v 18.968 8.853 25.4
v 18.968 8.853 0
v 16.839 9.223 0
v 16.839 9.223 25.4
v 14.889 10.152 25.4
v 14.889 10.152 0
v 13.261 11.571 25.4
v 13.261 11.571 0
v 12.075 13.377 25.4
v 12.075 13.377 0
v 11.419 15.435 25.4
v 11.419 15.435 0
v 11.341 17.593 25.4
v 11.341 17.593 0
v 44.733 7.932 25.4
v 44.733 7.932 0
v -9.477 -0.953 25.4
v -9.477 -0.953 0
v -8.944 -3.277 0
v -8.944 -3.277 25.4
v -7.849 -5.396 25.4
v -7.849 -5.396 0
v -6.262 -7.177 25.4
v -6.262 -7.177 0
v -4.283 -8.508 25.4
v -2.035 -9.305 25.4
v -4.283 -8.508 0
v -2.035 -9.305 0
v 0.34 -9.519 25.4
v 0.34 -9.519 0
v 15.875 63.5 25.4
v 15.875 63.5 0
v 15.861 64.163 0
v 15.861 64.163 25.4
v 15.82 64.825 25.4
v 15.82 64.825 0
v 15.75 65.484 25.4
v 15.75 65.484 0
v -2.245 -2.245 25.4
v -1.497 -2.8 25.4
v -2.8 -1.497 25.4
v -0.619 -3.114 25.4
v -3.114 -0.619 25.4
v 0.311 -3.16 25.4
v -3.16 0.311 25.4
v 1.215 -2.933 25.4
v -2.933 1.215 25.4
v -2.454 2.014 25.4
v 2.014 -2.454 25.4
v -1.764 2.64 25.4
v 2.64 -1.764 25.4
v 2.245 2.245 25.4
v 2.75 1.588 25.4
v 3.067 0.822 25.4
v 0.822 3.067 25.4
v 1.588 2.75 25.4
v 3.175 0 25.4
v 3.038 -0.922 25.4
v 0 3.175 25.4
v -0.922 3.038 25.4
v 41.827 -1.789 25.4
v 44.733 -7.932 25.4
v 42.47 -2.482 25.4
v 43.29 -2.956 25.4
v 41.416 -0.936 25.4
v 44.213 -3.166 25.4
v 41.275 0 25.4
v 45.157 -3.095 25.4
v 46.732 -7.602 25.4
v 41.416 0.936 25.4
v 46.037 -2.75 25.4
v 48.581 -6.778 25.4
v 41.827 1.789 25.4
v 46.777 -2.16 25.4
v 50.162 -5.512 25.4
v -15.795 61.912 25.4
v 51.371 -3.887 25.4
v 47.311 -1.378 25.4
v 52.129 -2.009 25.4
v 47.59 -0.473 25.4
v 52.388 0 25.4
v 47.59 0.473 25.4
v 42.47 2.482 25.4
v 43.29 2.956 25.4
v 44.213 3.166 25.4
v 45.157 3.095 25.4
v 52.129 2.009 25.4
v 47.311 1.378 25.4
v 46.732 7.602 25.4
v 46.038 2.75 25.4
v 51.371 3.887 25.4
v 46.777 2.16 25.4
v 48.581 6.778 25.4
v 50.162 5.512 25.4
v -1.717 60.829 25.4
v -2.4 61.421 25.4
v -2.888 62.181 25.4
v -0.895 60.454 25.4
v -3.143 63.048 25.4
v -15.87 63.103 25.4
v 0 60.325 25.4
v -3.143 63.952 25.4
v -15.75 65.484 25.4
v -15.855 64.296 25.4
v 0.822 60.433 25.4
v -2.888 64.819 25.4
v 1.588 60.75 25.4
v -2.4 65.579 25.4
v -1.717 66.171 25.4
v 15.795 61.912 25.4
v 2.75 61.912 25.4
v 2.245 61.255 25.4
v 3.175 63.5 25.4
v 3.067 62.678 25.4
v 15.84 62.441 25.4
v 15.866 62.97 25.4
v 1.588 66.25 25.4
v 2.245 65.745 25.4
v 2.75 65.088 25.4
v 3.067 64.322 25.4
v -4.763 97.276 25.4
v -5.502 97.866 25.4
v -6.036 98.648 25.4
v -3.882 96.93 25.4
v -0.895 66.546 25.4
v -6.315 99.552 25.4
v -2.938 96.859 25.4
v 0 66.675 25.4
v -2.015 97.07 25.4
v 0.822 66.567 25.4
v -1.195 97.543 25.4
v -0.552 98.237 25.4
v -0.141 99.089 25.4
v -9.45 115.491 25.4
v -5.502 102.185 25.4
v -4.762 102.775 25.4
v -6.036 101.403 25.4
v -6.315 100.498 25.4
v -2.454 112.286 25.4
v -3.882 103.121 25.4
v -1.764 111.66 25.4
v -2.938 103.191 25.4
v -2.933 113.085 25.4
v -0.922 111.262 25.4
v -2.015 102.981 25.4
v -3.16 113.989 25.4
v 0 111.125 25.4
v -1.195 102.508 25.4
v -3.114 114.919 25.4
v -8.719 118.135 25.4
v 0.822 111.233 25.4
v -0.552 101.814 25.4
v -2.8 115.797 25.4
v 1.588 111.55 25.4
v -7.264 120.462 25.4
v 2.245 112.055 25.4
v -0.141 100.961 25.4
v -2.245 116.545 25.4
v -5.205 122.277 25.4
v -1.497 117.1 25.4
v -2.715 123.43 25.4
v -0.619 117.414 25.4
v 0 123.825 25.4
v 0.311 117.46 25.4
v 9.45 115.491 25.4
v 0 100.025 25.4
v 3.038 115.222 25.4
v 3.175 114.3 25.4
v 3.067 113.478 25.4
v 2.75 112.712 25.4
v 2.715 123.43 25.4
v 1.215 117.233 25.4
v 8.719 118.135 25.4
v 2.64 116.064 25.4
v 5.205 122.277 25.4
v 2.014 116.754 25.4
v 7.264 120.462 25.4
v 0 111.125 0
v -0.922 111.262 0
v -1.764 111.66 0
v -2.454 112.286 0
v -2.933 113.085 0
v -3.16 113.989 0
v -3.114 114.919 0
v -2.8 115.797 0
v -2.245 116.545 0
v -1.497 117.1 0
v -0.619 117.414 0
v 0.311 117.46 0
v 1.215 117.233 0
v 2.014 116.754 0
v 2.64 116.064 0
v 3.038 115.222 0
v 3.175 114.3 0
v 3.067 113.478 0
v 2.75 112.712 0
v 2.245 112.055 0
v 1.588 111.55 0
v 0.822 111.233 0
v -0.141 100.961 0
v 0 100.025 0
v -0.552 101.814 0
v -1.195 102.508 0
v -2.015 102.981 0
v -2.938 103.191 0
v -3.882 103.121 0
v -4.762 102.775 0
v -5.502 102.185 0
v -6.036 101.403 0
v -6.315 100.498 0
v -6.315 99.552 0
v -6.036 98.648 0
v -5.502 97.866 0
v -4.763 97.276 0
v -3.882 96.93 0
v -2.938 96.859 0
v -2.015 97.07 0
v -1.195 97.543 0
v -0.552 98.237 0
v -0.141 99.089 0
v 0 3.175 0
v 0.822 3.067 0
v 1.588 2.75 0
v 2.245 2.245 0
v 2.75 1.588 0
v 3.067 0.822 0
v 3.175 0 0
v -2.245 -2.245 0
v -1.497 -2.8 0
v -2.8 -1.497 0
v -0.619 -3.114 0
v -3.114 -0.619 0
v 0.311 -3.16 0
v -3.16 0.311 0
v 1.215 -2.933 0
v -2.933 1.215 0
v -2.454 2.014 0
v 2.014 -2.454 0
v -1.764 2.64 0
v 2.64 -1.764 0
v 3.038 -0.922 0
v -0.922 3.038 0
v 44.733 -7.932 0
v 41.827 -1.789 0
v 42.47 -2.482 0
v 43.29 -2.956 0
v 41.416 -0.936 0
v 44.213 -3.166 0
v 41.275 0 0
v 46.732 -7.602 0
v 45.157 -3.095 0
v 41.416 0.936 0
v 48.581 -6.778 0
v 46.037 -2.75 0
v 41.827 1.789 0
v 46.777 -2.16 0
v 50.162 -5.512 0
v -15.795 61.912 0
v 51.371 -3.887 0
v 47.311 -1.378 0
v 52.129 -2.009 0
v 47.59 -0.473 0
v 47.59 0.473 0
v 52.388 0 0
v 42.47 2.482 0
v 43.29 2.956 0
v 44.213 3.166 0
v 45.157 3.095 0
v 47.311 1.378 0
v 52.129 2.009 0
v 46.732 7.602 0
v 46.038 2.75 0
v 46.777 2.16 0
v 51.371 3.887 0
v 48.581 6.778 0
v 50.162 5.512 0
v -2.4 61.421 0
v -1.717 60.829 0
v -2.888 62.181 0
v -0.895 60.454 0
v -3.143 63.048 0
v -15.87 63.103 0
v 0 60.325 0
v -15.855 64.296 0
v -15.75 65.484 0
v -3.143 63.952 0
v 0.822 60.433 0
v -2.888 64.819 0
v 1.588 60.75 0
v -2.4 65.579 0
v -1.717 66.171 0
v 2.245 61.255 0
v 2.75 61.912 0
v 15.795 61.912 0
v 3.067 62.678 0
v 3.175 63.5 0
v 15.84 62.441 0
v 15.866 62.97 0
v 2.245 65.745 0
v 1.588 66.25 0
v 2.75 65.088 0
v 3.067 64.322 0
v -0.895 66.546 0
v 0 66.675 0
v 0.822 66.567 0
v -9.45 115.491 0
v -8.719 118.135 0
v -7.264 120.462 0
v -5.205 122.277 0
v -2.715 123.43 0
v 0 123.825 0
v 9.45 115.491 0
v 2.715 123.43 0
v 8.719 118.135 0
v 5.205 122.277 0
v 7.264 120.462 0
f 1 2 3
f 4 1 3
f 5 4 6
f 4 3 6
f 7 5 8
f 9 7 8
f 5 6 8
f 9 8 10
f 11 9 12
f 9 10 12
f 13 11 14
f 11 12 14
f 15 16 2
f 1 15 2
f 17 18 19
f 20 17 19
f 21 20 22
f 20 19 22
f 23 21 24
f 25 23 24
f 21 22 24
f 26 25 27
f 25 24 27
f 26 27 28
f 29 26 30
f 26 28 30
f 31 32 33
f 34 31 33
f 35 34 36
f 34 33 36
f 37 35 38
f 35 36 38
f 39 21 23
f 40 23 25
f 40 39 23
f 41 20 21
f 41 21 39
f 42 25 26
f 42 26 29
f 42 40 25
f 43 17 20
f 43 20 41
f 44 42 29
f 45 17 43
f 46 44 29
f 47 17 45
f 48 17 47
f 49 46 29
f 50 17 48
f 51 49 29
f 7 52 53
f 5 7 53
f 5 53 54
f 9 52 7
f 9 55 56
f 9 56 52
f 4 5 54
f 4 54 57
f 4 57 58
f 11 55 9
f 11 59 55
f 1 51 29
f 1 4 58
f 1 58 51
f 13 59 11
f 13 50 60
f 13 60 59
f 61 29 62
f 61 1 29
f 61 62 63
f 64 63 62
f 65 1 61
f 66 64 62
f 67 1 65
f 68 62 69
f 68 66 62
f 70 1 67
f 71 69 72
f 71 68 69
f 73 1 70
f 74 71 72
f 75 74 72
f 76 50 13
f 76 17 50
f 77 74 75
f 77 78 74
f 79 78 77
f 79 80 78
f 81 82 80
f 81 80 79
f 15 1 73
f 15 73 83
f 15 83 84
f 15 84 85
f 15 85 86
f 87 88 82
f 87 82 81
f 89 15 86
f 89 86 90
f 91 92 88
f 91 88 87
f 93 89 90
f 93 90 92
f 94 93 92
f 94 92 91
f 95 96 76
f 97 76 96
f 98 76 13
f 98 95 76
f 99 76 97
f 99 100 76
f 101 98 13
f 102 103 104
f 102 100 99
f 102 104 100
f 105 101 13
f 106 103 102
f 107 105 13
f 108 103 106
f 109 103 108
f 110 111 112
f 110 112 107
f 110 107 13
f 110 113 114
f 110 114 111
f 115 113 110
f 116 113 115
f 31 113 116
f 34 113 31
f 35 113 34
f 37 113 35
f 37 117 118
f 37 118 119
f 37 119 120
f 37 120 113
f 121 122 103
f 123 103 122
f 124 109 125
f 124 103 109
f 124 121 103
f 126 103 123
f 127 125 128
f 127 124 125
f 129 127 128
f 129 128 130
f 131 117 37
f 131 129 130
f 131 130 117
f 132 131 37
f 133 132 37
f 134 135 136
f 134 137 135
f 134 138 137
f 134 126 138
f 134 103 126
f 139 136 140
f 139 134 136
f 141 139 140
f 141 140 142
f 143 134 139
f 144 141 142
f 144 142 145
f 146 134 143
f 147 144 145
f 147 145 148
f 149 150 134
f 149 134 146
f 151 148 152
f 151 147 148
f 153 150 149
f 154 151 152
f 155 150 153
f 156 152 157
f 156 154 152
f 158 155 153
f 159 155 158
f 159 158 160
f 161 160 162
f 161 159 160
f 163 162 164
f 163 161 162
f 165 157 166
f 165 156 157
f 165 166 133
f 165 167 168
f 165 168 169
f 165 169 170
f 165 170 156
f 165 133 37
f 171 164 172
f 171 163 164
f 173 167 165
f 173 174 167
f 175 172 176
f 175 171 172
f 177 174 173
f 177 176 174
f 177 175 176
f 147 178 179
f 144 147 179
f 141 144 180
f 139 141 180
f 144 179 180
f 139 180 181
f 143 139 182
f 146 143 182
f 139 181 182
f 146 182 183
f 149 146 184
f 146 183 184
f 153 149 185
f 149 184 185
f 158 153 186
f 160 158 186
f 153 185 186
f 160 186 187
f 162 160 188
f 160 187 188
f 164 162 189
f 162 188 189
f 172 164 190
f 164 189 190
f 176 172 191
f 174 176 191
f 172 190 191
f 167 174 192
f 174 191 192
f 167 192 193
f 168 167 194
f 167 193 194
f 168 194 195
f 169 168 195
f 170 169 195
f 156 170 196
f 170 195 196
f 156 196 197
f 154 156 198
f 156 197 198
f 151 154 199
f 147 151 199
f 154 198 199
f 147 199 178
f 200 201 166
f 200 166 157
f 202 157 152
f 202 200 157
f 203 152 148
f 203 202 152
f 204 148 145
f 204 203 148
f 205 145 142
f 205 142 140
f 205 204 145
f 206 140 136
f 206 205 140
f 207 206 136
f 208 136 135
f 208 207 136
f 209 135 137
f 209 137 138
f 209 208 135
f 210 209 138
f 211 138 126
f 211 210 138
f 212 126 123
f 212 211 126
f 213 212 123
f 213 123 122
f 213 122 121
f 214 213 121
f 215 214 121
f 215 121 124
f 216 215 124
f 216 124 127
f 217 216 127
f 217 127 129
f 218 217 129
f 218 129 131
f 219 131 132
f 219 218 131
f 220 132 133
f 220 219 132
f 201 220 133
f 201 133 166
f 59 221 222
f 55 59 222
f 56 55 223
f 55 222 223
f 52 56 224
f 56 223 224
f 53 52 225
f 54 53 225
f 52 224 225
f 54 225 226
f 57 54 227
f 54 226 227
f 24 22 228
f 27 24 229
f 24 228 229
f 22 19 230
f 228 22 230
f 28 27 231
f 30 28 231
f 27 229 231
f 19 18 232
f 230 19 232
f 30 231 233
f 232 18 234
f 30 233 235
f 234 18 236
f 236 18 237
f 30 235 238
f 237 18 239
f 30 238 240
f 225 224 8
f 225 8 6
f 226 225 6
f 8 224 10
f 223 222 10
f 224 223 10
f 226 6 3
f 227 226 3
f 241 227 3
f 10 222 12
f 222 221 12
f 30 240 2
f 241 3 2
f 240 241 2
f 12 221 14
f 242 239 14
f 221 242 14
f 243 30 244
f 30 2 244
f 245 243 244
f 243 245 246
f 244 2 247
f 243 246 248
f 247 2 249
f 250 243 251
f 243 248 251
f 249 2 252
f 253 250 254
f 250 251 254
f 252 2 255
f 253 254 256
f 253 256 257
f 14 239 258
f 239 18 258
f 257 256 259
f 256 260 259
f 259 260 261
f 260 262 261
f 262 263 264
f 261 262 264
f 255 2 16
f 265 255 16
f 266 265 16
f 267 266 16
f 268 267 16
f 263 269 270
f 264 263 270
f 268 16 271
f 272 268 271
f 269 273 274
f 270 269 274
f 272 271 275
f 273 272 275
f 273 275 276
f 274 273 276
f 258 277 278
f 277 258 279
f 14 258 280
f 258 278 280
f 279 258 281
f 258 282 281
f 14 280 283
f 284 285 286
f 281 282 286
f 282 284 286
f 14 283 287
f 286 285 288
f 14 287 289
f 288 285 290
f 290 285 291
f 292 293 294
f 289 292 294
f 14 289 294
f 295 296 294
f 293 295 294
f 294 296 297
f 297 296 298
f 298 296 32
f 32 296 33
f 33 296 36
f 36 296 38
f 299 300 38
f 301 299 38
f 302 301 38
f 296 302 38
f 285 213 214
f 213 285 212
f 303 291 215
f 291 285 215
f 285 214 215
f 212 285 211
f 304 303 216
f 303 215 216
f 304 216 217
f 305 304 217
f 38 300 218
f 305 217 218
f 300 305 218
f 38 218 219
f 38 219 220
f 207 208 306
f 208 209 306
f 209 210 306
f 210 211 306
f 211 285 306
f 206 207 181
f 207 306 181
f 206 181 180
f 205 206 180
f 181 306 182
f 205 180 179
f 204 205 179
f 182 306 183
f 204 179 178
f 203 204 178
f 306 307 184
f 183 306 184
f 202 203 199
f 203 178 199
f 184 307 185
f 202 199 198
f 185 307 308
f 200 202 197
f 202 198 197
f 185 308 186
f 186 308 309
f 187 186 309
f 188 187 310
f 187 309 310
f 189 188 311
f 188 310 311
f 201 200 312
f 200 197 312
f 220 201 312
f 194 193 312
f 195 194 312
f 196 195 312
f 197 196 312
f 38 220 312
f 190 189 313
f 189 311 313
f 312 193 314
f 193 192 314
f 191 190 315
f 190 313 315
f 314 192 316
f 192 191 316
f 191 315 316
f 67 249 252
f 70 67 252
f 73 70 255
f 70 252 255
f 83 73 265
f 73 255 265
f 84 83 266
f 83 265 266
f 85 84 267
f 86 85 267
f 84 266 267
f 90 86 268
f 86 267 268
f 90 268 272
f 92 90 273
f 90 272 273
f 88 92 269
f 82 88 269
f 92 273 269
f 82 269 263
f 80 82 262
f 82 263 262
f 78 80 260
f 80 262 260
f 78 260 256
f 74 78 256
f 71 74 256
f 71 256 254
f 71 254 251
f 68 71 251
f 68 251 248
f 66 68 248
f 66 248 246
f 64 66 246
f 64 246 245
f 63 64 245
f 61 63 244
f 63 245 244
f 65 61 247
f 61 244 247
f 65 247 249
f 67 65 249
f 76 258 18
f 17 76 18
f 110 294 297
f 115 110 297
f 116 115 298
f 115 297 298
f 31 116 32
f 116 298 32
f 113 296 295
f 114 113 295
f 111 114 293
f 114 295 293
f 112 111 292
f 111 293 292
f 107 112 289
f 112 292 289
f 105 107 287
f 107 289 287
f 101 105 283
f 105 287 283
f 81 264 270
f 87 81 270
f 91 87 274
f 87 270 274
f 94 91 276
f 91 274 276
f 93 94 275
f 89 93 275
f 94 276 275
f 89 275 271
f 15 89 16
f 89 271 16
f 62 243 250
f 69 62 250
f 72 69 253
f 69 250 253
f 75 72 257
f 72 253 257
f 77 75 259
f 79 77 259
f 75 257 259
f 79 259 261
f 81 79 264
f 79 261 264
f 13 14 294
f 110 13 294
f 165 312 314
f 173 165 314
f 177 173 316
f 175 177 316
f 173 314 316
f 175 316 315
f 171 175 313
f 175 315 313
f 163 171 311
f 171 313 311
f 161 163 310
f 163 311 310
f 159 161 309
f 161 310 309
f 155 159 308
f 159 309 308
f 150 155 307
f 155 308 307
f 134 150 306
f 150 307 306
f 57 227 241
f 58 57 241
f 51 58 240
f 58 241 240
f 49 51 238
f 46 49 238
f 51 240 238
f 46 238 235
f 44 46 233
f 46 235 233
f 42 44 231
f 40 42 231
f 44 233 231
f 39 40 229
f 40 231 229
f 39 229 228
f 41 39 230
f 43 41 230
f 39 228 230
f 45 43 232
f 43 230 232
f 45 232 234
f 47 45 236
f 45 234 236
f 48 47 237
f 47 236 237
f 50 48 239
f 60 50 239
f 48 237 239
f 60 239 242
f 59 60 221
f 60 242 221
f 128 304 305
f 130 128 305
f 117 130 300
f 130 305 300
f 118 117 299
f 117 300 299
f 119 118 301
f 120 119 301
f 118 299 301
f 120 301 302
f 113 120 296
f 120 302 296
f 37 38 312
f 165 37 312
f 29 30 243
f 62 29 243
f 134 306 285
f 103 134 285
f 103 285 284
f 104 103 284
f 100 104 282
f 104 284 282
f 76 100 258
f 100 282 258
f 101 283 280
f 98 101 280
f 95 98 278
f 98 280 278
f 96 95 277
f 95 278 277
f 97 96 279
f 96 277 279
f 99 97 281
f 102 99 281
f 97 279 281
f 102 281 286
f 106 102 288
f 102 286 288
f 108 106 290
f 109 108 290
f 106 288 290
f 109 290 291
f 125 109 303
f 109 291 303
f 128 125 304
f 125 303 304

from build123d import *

# Parameters (mm, degrees)
F0_R     = 3.175
F1_DEPTH = 25.4


with BuildPart() as f1:
    # F0 (on Top) → F1 (new body)
    with BuildSketch(Plane.XY):
        with BuildLine():
            ThreePointArc((9.4502929642, 115.490625), (0, 123.825), (-9.4502929642, 115.490625))
            ThreePointArc((-9.4502929642, 115.490625), (-7.14375, 107.9998046905), (0, 104.775))
            ThreePointArc((0, 104.775), (6.7351920908, 107.5648079092), (9.525, 114.3))
            ThreePointArc((9.525, 114.3), (9.5063048942, 114.896483242), (9.4502929642, 115.490625))
        make_face()
        with BuildLine():
            ThreePointArc((3.175, 114.3), (2.2450640303, 112.0549359697), (0, 111.125))
            ThreePointArc((0, 111.125), (-2.2450640303, 116.5450640303), (3.175, 114.3))
        make_face(mode=Mode.SUBTRACT)
        with BuildLine():
            Line((0, 100.0252), (0, 79.375))
            ThreePointArc((0, 79.375), (10.5003255158, 75.40625), (15.7504882737, 65.484375))
            Line((15.7504882737, 65.484375), (9.4502929642, 115.490625))
            ThreePointArc((9.4502929642, 115.490625), (9.5063048942, 114.896483242), (9.525, 114.3))
            ThreePointArc((9.525, 114.3), (6.7351920908, 107.5648079092), (0, 104.775))
            Line((0, 104.775), (0, 100.0252))
        make_face()
        with BuildLine():
            Line((-9.4502929642, 115.490625), (-15.7504882737, 65.484375))
            ThreePointArc((-15.7504882737, 65.484375), (-10.5003255158, 75.40625), (0, 79.375))
            Line((0, 79.375), (0, 100.0252))
            Line((0, 100.0252), (0, 104.775))
            ThreePointArc((0, 104.775), (-7.14375, 107.9998046905), (-9.4502929642, 115.490625))
        make_face()
        with Locations((-3.175, 100.0252)):
            Circle(F0_R, mode=Mode.SUBTRACT)
        with BuildLine():
            ThreePointArc((-9.4772553384, -0.9525), (-7.063929059, 6.3895642457), (0, 9.525))
            Line((0, 9.525), (0, 47.625))
            ThreePointArc((0, 47.625), (-10.6492737428, 51.7267849017), (-15.7954255641, 61.9125))
            Line((-15.7954255641, 61.9125), (-9.4772553384, -0.9525))
        make_face()
        with BuildLine():
            Line((0, 47.625), (0, 9.525))
            ThreePointArc((0, 9.525), (6.7351920908, 6.7351920908), (9.525, 0))
            Line((9.525, 0), (36.5125, 0))
            ThreePointArc((36.5125, 0), (38.9384772185, 5.7120069047), (44.7334821429, 7.9324362036))
            Line((44.7334821429, 7.9324362036), (18.9676000005, 8.8532337108))
            ThreePointArc((18.9676000005, 8.8532337108), (13.2611998974, 11.5713591498), (11.3411865923, 17.5933818124))
            Line((11.3411865923, 17.5933818124), (15.7954255641, 61.9125))
            ThreePointArc((15.7954255641, 61.9125), (10.6492737428, 51.7267849017), (0, 47.625))
        make_face()
        with BuildLine():
            Line((0, 60.325), (0, 47.625))
            ThreePointArc((0, 47.625), (10.6492737428, 51.7267849017), (15.7954255641, 61.9125))
            ThreePointArc((15.7954255641, 61.9125), (15.8550939106, 62.7052534459), (15.875, 63.5))
            ThreePointArc((15.875, 63.5), (15.8438414904, 64.4941387366), (15.7504882737, 65.484375))
            ThreePointArc((15.7504882737, 65.484375), (10.5003255158, 75.40625), (0, 79.375))
            Line((0, 79.375), (0, 66.675))
            ThreePointArc((0, 66.675), (2.2450640303, 65.7450640303), (3.175, 63.5))
            ThreePointArc((3.175, 63.5), (2.2450640303, 61.2549359697), (0, 60.325))
        make_face()
        with BuildLine():
            ThreePointArc((-15.7954255641, 61.9125), (-10.6492737428, 51.7267849017), (0, 47.625))
            Line((0, 47.625), (0, 60.325))
            ThreePointArc((0, 60.325), (-3.175, 63.5), (0, 66.675))
            Line((0, 66.675), (0, 79.375))
            ThreePointArc((0, 79.375), (-10.5003255158, 75.40625), (-15.7504882737, 65.484375))
            ThreePointArc((-15.7504882737, 65.484375), (-15.8737438155, 63.6997054867), (-15.7954255641, 61.9125))
        make_face()
        with BuildLine():
            Line((0, 9.525), (0, 3.175))
            ThreePointArc((0, 3.175), (2.2450640303, 2.2450640303), (3.175, 0))
            Line((3.175, 0), (9.525, 0))
            ThreePointArc((9.525, 0), (6.7351920908, 6.7351920908), (0, 9.525))
        make_face()
        with BuildLine():
            ThreePointArc((3.175, 0), (-2.2450640303, -2.2450640303), (0, 3.175))
            Line((0, 3.175), (0, 9.525))
            ThreePointArc((0, 9.525), (-7.063929059, 6.3895642457), (-9.4772553384, -0.9525))
            ThreePointArc((-9.4772553384, -0.9525), (-6.2623833816, -7.1769199091), (0.3401785714, -9.5189234444))
            ThreePointArc((0.3401785714, -9.5189234444), (6.8544082857, -6.6138273378), (9.525, 0))
            Line((9.525, 0), (3.175, 0))
        make_face()
        with BuildLine():
            Line((36.5125, 0), (9.525, 0))
            ThreePointArc((9.525, 0), (6.8544082857, -6.6138273378), (0.3401785714, -9.5189234444))
            Line((0.3401785714, -9.5189234444), (44.7334821429, -7.9324362036))
            ThreePointArc((44.7334821429, -7.9324362036), (38.9384772185, -5.7120069047), (36.5125, 0))
        make_face()
        with BuildLine():
            ThreePointArc((44.7334821429, 7.9324362036), (38.9384772185, 5.7120069047), (36.5125, 0))
            ThreePointArc((36.5125, 0), (38.9384772185, -5.7120069047), (44.7334821429, -7.9324362036))
            ThreePointArc((44.7334821429, -7.9324362036), (50.1620069047, -5.5115227815), (52.3875, 0))
            ThreePointArc((52.3875, 0), (50.1620069047, 5.5115227815), (44.7334821429, 7.9324362036))
        make_face()
        with BuildLine():
            ThreePointArc((47.625, 0), (44.45, -3.175), (41.275, 0))
            ThreePointArc((41.275, 0), (44.45, 3.175), (47.625, 0))
        make_face(mode=Mode.SUBTRACT)
    extrude(amount=F1_DEPTH)


solid = f1.part
